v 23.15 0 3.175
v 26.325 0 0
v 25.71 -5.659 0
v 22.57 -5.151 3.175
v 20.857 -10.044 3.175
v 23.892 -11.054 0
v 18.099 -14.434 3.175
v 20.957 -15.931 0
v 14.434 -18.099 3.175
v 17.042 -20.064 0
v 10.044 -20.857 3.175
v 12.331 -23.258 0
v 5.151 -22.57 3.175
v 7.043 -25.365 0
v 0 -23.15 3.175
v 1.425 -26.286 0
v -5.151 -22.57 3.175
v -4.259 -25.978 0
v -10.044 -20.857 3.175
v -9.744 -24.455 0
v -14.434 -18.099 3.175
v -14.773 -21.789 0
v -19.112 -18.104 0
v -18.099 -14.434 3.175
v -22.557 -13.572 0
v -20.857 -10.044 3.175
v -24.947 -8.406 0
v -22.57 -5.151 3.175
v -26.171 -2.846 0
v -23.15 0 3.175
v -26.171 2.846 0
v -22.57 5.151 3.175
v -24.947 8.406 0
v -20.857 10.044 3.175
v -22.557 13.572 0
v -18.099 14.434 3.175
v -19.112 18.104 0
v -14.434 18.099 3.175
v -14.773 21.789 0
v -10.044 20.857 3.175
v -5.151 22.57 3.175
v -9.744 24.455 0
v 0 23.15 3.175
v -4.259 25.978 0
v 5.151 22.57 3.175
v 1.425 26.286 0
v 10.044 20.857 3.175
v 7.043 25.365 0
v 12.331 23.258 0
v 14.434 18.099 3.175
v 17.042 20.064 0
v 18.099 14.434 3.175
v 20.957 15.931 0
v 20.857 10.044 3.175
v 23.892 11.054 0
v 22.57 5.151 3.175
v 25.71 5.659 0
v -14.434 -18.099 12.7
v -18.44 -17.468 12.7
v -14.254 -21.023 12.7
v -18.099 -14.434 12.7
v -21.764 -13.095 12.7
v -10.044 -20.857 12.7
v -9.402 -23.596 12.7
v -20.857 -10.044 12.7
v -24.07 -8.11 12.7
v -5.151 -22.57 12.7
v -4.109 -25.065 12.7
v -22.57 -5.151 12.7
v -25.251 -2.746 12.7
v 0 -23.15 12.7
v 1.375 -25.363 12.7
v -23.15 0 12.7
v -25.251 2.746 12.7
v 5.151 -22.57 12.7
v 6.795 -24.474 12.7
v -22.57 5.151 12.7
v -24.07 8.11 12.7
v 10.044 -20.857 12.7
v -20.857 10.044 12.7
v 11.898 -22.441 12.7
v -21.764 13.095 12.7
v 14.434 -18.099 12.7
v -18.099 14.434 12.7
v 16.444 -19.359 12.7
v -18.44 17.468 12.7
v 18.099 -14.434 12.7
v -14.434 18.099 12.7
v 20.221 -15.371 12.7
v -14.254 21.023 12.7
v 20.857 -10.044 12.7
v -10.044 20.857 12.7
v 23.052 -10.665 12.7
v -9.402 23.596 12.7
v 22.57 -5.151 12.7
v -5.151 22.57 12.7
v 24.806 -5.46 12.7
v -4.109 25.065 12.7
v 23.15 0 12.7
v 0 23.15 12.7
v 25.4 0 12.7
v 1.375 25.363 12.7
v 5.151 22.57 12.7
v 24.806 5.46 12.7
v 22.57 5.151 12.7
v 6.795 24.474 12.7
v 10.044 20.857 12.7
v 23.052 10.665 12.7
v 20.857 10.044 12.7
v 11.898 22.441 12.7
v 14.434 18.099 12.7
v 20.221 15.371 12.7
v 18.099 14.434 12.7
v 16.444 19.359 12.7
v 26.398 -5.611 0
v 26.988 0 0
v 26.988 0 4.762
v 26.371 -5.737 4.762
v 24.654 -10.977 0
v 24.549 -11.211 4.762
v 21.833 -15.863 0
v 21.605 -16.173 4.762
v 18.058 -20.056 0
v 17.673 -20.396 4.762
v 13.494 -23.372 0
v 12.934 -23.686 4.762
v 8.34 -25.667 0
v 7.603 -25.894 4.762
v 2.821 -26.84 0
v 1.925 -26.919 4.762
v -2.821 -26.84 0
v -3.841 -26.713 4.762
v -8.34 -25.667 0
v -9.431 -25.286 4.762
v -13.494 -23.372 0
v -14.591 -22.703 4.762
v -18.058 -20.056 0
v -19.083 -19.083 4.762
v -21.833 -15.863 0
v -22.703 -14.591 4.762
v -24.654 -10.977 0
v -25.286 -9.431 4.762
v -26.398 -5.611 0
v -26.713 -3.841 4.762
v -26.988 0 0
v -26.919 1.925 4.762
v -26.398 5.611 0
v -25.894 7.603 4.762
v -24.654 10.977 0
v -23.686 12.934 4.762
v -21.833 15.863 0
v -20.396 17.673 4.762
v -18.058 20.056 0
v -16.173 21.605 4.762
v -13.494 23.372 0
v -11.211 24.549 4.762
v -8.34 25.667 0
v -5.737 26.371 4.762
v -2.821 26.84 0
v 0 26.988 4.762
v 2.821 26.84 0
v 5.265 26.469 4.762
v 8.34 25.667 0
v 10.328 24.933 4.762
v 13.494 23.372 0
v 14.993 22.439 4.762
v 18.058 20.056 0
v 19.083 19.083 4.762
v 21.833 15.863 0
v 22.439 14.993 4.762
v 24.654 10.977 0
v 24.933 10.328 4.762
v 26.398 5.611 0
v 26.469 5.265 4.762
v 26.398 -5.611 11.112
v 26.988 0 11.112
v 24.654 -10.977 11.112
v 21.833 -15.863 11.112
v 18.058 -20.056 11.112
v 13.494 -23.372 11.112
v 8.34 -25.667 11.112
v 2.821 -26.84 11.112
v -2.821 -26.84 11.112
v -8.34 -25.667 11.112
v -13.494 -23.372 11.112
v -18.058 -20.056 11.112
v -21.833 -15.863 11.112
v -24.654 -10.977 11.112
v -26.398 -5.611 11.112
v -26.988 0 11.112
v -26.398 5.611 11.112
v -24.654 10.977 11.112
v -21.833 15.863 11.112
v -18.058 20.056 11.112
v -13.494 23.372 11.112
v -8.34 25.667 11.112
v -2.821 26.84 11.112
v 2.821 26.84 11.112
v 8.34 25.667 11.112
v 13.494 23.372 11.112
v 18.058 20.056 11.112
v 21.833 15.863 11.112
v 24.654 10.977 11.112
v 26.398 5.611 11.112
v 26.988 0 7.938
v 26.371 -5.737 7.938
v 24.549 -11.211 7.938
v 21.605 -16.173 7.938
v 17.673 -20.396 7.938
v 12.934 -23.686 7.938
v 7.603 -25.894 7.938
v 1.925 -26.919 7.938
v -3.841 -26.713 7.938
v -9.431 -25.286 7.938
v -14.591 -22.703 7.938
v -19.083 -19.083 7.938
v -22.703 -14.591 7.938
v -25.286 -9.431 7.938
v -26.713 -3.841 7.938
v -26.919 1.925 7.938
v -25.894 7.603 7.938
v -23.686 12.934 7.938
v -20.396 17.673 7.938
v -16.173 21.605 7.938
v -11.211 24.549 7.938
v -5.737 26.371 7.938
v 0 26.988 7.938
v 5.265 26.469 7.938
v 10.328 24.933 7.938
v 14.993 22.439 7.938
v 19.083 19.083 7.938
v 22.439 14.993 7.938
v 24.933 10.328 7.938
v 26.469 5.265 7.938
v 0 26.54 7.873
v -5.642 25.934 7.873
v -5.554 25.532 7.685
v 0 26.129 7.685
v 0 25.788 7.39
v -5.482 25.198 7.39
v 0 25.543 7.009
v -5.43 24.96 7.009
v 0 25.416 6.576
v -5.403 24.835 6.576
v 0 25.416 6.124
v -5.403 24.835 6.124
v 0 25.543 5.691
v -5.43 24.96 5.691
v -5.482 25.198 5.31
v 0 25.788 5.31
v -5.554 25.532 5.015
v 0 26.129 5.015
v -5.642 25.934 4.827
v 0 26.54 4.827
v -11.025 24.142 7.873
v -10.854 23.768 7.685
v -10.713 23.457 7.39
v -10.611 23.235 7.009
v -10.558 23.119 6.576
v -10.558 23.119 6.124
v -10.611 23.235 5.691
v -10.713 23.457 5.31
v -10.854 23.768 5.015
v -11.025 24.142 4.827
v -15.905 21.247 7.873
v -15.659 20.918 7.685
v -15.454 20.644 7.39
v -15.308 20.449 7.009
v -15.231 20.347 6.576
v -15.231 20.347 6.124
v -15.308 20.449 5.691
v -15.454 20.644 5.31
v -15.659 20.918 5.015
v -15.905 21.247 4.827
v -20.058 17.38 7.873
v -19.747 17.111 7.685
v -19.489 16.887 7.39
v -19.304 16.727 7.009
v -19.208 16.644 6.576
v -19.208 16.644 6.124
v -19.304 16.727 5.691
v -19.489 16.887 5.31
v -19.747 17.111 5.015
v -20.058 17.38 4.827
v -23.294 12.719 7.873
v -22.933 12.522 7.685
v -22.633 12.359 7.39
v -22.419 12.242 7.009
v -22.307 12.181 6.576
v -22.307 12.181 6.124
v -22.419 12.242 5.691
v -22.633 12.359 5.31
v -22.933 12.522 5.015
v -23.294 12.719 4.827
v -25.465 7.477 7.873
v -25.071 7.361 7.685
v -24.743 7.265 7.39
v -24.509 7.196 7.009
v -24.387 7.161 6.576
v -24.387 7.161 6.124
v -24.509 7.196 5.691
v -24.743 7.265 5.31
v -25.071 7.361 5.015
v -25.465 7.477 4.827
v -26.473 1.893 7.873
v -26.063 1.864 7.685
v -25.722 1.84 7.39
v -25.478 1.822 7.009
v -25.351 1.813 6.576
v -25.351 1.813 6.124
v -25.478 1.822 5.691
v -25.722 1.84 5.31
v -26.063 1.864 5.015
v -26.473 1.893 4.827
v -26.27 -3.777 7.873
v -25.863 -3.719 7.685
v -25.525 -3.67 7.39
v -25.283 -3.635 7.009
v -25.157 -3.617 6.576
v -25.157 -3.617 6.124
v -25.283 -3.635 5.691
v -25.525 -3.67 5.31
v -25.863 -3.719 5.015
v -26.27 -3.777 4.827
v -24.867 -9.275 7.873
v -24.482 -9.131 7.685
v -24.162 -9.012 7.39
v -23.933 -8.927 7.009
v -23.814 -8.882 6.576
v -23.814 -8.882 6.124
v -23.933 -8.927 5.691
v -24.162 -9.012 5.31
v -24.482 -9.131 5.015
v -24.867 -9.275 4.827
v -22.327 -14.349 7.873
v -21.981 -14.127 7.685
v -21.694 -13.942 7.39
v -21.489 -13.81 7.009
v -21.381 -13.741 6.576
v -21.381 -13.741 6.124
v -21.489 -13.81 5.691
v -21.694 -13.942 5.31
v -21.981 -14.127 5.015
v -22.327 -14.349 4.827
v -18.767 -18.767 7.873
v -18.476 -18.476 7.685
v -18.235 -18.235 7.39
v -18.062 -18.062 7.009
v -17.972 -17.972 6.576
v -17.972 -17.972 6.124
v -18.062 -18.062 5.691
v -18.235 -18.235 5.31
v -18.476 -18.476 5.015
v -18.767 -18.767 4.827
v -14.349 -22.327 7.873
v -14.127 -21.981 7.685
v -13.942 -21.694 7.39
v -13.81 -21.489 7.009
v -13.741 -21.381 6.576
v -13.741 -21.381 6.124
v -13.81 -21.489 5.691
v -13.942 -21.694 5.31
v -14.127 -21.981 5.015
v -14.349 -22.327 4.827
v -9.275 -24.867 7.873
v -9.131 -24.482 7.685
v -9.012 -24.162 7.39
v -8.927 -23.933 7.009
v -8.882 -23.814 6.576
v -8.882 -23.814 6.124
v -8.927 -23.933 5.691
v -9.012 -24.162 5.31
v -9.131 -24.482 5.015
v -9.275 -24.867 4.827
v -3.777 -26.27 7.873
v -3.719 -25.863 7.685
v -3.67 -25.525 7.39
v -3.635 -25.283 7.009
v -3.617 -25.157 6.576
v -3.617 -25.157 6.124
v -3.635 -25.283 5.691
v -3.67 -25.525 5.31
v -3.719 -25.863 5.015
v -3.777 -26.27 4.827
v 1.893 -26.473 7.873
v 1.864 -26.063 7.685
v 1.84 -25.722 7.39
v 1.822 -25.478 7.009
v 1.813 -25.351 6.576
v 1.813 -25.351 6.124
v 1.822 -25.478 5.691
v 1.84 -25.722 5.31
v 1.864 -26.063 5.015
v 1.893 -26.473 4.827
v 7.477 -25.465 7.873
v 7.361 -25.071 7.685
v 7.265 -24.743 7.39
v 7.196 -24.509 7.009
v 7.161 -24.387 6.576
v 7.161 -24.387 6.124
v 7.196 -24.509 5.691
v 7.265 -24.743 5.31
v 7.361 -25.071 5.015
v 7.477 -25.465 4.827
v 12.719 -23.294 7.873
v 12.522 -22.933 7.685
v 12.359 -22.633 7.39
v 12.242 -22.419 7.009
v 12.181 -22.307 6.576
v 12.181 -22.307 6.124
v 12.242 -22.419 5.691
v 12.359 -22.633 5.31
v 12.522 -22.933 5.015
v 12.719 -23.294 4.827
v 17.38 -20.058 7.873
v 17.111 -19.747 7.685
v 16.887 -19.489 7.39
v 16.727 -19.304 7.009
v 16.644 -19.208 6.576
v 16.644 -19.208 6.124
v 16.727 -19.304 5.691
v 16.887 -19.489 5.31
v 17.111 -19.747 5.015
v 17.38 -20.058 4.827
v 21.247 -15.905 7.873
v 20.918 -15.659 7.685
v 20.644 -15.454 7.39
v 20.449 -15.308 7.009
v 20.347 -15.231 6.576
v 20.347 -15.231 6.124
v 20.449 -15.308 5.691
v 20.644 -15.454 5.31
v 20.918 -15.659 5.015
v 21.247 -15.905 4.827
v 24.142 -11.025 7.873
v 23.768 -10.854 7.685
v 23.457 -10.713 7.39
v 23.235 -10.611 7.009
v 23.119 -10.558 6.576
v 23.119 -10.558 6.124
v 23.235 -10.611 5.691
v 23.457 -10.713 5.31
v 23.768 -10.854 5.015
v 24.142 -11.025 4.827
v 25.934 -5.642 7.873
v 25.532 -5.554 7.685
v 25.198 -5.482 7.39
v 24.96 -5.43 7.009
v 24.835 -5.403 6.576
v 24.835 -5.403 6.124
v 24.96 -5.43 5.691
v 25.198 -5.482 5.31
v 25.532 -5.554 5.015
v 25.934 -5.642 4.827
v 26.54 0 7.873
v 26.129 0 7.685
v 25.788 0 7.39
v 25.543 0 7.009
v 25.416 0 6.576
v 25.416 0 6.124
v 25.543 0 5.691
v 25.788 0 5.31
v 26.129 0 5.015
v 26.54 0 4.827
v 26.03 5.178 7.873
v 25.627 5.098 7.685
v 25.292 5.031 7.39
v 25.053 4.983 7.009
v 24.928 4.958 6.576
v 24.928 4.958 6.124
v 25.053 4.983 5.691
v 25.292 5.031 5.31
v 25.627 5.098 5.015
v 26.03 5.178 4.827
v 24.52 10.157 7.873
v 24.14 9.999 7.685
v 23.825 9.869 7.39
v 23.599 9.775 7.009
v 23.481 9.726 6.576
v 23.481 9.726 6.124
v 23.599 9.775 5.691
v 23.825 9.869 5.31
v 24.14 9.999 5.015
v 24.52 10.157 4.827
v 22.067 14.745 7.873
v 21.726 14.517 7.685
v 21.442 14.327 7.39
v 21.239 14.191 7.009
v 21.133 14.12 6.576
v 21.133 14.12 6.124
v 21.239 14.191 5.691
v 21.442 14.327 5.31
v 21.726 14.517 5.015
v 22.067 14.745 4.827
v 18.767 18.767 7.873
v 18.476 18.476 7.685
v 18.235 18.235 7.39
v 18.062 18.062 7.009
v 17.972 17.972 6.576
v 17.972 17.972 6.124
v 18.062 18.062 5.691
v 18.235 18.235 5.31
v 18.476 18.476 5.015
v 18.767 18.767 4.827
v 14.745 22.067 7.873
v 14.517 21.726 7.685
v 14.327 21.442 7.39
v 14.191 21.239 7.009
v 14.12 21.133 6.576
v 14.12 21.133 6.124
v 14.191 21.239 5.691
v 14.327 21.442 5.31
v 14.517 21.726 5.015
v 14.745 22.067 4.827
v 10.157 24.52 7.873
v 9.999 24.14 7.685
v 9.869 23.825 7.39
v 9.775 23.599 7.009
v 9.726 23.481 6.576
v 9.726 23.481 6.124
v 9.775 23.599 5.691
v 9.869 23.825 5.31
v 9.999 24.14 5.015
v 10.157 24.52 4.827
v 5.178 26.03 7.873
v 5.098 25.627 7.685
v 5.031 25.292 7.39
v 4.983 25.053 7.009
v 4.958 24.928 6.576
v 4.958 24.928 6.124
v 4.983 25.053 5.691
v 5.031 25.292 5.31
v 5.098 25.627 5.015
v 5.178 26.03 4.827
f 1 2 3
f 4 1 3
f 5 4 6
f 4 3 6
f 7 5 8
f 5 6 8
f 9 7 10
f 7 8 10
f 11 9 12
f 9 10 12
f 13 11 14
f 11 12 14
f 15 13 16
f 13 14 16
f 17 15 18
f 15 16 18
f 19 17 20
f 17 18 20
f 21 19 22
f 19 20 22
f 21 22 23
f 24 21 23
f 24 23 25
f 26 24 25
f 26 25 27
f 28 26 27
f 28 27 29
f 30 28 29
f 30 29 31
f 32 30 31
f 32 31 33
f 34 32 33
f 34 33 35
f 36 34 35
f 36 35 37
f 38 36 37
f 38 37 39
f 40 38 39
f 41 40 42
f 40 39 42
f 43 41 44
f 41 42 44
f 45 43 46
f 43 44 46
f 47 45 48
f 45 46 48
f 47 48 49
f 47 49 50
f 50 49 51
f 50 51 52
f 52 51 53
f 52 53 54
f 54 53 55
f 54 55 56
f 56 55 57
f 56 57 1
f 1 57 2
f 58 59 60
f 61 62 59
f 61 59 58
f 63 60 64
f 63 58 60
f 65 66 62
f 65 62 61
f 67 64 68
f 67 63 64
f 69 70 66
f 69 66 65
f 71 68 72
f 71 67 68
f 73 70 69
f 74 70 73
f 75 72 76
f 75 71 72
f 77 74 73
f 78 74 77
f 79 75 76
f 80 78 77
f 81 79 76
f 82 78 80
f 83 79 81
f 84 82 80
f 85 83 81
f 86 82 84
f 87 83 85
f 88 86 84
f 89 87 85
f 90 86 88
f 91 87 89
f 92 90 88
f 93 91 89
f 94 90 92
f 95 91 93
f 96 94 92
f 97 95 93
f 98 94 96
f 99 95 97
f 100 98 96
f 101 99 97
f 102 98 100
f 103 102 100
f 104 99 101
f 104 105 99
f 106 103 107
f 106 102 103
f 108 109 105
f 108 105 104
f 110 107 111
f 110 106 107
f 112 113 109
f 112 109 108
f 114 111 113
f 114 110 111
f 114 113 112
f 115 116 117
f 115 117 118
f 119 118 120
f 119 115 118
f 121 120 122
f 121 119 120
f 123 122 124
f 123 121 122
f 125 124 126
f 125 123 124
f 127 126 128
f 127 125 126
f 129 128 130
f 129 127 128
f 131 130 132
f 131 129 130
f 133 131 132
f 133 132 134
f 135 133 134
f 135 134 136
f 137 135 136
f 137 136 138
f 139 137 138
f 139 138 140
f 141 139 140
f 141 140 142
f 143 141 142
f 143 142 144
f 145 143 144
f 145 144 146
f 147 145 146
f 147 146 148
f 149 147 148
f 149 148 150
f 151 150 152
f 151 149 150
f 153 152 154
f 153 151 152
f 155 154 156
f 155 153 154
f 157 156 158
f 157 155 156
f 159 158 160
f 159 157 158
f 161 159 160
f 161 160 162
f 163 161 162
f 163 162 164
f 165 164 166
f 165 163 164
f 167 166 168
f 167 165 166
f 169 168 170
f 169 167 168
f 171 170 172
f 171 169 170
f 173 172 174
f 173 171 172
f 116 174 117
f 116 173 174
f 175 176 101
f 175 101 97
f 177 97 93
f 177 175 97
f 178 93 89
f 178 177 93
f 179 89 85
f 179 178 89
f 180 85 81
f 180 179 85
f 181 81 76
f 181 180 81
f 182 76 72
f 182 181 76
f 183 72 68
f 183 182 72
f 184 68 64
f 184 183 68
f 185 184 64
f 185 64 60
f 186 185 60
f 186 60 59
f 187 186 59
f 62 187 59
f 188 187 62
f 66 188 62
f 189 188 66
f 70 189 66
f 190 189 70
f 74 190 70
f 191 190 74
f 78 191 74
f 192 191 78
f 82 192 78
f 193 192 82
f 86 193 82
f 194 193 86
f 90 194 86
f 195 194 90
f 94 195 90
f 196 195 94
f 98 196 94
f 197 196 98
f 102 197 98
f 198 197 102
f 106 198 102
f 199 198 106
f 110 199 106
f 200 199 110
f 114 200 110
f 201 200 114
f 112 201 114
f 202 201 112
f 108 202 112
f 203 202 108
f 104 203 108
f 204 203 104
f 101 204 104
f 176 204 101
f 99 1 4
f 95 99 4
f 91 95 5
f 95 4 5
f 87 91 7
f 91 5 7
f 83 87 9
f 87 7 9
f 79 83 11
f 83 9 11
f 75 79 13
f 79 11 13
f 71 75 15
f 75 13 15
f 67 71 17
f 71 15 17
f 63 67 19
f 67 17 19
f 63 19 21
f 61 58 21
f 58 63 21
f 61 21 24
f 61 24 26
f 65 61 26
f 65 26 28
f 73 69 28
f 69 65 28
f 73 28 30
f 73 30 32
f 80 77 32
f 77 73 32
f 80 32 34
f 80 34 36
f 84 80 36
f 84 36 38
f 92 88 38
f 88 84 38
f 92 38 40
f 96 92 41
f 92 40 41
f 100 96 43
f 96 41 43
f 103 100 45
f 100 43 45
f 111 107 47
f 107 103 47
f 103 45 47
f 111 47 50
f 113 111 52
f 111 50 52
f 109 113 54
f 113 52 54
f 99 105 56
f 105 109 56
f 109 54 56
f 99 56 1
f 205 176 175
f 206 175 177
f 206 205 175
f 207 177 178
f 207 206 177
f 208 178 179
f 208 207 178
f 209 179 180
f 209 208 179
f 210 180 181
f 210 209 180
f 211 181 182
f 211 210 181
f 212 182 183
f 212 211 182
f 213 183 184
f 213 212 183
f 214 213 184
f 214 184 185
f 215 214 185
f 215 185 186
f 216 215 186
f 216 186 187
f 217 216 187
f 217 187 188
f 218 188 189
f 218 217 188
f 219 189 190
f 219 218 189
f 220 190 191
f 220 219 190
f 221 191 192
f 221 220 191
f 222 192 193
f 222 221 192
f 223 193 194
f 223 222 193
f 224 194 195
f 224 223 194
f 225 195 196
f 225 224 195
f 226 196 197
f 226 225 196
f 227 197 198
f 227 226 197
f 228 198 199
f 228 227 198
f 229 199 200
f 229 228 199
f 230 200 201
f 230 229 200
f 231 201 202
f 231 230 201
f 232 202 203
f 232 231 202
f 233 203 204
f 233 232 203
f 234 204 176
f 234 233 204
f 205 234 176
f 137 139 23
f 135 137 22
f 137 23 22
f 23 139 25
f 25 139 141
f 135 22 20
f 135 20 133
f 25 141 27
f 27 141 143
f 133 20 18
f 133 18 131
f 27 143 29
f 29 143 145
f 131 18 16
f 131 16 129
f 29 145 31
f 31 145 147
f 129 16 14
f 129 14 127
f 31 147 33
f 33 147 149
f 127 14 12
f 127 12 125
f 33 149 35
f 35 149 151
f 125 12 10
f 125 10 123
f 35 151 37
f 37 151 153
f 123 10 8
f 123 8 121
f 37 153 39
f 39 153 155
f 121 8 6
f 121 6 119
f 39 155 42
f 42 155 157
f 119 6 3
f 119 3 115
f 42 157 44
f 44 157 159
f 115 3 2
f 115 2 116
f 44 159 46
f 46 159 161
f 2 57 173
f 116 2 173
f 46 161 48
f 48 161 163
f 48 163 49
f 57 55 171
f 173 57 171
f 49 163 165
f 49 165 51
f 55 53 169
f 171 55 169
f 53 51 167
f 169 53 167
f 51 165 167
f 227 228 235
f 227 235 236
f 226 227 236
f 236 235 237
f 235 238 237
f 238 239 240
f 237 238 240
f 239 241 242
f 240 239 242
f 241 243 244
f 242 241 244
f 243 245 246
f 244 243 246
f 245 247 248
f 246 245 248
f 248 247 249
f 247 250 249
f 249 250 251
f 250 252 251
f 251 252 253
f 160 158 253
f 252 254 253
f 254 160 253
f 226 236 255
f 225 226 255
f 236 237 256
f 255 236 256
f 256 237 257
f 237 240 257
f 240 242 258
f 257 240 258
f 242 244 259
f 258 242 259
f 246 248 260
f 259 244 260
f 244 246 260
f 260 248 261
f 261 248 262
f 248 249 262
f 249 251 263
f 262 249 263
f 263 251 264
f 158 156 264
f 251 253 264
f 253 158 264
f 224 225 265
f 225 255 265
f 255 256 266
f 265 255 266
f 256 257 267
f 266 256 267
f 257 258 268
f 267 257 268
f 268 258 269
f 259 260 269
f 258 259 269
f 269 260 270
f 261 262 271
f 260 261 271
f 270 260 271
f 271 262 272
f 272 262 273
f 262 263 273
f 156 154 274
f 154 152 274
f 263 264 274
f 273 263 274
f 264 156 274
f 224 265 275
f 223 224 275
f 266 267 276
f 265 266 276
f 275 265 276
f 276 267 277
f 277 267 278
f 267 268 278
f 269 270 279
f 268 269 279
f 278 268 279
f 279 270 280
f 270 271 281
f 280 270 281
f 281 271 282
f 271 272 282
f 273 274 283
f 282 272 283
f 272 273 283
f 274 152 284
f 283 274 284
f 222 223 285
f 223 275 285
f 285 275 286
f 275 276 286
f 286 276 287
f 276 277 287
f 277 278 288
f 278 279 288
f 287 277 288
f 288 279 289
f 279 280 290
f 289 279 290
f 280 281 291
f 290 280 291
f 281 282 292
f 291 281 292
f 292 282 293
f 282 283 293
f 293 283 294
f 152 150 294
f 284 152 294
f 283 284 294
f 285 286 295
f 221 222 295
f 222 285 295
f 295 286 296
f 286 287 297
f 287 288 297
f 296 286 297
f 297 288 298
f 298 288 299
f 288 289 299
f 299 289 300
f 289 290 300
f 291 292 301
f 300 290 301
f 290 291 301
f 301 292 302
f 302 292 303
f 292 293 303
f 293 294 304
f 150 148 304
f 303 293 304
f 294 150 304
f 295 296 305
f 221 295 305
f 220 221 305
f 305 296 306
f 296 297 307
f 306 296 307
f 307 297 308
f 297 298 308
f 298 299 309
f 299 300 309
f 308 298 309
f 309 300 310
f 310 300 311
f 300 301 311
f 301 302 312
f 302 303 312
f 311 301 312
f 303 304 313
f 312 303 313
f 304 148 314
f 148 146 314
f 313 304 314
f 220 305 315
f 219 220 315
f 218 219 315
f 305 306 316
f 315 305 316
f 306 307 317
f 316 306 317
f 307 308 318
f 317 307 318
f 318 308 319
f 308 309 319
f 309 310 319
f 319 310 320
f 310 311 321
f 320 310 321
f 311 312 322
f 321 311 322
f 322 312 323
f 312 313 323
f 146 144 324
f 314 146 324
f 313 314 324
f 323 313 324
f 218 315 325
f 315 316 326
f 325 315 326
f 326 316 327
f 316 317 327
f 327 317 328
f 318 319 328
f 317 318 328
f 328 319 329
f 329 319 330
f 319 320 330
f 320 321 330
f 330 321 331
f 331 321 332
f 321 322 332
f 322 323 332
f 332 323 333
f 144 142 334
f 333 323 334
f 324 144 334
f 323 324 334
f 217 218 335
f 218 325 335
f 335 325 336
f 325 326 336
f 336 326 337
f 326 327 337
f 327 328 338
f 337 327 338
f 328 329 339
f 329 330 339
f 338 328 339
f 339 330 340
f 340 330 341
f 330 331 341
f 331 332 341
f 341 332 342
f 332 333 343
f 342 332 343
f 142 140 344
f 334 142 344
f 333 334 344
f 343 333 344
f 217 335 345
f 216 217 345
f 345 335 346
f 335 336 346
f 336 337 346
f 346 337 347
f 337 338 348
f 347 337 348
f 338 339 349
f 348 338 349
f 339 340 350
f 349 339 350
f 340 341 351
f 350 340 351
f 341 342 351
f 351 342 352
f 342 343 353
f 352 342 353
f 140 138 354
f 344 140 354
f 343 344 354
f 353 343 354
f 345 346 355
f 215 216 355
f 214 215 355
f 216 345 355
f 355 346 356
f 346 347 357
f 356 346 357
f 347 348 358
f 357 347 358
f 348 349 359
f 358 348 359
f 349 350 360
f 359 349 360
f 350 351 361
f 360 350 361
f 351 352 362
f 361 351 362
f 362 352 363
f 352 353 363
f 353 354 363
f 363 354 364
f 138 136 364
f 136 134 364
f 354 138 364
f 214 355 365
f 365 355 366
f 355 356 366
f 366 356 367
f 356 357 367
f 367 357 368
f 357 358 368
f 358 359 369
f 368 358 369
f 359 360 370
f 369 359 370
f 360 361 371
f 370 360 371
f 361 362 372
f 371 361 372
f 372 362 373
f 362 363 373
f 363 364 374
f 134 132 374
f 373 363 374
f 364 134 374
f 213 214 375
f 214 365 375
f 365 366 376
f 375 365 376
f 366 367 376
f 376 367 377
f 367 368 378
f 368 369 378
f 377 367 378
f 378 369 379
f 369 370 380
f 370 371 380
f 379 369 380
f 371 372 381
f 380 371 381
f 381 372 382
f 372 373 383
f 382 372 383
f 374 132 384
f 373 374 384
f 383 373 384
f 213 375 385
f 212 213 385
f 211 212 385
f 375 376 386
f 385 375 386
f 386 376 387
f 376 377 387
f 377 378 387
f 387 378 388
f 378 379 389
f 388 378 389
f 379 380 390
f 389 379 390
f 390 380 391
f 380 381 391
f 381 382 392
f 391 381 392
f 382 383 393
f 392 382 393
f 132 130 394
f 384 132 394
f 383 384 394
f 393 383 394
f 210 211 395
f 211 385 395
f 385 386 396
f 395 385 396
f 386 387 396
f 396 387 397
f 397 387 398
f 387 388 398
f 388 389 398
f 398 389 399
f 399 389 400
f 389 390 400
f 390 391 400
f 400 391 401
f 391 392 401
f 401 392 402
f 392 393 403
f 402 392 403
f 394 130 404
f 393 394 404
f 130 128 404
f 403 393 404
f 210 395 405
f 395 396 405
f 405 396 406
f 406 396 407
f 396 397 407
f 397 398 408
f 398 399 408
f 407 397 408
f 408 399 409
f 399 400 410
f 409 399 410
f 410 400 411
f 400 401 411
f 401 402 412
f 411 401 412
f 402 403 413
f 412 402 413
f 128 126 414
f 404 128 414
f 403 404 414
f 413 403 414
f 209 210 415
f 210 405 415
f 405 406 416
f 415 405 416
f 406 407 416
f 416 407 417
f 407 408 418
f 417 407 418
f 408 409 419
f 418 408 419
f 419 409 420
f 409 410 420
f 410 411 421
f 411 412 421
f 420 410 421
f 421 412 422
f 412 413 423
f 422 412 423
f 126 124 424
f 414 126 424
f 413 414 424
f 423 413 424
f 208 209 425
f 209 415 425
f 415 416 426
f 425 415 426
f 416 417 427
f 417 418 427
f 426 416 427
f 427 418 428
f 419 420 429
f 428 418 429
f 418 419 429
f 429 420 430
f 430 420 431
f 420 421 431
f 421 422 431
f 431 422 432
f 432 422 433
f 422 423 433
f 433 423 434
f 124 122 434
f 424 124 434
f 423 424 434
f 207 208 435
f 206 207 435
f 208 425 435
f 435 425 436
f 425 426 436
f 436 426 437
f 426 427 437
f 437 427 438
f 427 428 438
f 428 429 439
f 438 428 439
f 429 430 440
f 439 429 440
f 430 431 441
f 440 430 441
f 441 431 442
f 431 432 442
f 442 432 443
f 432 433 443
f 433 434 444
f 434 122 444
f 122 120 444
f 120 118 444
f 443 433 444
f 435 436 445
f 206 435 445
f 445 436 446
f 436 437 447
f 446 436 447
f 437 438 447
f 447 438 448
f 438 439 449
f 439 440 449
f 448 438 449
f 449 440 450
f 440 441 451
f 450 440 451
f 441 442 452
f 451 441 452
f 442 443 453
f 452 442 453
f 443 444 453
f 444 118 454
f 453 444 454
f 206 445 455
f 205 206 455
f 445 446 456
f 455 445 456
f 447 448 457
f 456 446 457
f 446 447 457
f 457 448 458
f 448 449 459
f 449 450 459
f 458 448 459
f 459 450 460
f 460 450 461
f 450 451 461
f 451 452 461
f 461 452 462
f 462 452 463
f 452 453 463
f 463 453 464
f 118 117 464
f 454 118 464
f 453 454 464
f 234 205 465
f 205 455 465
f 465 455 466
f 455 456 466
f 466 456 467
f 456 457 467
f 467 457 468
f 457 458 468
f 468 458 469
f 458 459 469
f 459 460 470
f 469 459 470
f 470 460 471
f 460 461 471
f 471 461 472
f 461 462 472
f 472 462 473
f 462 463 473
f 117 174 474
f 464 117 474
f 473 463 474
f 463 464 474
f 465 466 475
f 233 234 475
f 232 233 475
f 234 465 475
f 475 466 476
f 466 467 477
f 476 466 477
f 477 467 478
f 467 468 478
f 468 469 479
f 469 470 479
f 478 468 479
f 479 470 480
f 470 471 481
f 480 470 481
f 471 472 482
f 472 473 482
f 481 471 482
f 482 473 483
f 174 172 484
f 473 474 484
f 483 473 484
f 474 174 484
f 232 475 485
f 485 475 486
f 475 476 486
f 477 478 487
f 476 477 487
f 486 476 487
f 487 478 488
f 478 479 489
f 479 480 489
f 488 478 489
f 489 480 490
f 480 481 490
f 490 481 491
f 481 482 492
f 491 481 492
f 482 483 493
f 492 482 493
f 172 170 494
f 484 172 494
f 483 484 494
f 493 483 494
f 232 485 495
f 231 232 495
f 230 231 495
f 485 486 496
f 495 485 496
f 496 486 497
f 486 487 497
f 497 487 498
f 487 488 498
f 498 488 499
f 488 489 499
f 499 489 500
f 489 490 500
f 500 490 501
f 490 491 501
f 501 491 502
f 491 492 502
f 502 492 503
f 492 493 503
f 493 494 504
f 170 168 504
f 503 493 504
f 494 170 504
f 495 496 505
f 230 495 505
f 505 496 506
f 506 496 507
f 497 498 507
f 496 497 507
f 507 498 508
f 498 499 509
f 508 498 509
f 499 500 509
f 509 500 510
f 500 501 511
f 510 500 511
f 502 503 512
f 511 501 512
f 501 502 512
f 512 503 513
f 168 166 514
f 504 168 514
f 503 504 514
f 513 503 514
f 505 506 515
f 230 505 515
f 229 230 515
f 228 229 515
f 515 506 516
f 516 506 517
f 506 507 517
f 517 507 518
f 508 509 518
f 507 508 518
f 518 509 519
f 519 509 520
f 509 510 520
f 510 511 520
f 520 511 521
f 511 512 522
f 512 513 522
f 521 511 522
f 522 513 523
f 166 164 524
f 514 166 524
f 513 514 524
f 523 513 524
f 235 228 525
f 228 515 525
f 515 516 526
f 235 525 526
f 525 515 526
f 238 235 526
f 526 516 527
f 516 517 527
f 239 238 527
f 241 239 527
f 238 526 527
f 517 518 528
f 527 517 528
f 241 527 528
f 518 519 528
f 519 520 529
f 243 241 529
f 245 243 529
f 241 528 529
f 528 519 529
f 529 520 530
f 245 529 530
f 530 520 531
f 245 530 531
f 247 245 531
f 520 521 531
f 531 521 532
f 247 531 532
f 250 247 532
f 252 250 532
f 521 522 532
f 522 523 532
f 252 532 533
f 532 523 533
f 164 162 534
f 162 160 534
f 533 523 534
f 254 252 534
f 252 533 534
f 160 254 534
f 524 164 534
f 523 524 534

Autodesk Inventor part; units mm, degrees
ref_plane "YZ Plane" through (0, 0, 0) normal (1, 0, 0) x (0, 1, 0)
ref_plane "XZ Plane" through (0, 0, 0) normal (0, 1, 0) x (-1, 0, 0)
ref_plane "XY Plane" through (0, 0, 0) normal (0, 0, 1) x (1, 0, 0)
sketch "Sketch1" plane through (0, 0, 0) normal (0, 0, 1) x (1, 0, 0)
  circle A0 centre (0, 0) radius 23.15
  circle A1 centre (0, 0) radius 26.9875
  dimension "d0" = 46.3
  dimension "d1" = 53.975
extrude "Extrusion1" add sketch "Sketch1" along normal blind 12.7
chamfer "Chamfer1" distance 3.175 angle 45 1 edges at (-23.15, 0, 0)
sketch "Sketch2" plane through (0, 0, 0) normal (1, 0, 0) x (0, 1, 0)
  line L0 (26.9875, 0) -> (26.9875, 12.7) projected
  circle A0 centre (26.9875, 6.35) radius 1.5875
  line L1 (0, 0) -> (0, 25.7479) construction
  dimension "d7" = 3.175
revolve "Revolution1" cut sketch "Sketch2" angle 360 about axis through (0, 0, 0) along (0, 0, 1)
chamfer "Chamfer2" distance 1.5875 angle 45 1 edges at (-26.9875, 0, 12.7)
properties part number "Ring Hub" material "Nylon 6/6"
